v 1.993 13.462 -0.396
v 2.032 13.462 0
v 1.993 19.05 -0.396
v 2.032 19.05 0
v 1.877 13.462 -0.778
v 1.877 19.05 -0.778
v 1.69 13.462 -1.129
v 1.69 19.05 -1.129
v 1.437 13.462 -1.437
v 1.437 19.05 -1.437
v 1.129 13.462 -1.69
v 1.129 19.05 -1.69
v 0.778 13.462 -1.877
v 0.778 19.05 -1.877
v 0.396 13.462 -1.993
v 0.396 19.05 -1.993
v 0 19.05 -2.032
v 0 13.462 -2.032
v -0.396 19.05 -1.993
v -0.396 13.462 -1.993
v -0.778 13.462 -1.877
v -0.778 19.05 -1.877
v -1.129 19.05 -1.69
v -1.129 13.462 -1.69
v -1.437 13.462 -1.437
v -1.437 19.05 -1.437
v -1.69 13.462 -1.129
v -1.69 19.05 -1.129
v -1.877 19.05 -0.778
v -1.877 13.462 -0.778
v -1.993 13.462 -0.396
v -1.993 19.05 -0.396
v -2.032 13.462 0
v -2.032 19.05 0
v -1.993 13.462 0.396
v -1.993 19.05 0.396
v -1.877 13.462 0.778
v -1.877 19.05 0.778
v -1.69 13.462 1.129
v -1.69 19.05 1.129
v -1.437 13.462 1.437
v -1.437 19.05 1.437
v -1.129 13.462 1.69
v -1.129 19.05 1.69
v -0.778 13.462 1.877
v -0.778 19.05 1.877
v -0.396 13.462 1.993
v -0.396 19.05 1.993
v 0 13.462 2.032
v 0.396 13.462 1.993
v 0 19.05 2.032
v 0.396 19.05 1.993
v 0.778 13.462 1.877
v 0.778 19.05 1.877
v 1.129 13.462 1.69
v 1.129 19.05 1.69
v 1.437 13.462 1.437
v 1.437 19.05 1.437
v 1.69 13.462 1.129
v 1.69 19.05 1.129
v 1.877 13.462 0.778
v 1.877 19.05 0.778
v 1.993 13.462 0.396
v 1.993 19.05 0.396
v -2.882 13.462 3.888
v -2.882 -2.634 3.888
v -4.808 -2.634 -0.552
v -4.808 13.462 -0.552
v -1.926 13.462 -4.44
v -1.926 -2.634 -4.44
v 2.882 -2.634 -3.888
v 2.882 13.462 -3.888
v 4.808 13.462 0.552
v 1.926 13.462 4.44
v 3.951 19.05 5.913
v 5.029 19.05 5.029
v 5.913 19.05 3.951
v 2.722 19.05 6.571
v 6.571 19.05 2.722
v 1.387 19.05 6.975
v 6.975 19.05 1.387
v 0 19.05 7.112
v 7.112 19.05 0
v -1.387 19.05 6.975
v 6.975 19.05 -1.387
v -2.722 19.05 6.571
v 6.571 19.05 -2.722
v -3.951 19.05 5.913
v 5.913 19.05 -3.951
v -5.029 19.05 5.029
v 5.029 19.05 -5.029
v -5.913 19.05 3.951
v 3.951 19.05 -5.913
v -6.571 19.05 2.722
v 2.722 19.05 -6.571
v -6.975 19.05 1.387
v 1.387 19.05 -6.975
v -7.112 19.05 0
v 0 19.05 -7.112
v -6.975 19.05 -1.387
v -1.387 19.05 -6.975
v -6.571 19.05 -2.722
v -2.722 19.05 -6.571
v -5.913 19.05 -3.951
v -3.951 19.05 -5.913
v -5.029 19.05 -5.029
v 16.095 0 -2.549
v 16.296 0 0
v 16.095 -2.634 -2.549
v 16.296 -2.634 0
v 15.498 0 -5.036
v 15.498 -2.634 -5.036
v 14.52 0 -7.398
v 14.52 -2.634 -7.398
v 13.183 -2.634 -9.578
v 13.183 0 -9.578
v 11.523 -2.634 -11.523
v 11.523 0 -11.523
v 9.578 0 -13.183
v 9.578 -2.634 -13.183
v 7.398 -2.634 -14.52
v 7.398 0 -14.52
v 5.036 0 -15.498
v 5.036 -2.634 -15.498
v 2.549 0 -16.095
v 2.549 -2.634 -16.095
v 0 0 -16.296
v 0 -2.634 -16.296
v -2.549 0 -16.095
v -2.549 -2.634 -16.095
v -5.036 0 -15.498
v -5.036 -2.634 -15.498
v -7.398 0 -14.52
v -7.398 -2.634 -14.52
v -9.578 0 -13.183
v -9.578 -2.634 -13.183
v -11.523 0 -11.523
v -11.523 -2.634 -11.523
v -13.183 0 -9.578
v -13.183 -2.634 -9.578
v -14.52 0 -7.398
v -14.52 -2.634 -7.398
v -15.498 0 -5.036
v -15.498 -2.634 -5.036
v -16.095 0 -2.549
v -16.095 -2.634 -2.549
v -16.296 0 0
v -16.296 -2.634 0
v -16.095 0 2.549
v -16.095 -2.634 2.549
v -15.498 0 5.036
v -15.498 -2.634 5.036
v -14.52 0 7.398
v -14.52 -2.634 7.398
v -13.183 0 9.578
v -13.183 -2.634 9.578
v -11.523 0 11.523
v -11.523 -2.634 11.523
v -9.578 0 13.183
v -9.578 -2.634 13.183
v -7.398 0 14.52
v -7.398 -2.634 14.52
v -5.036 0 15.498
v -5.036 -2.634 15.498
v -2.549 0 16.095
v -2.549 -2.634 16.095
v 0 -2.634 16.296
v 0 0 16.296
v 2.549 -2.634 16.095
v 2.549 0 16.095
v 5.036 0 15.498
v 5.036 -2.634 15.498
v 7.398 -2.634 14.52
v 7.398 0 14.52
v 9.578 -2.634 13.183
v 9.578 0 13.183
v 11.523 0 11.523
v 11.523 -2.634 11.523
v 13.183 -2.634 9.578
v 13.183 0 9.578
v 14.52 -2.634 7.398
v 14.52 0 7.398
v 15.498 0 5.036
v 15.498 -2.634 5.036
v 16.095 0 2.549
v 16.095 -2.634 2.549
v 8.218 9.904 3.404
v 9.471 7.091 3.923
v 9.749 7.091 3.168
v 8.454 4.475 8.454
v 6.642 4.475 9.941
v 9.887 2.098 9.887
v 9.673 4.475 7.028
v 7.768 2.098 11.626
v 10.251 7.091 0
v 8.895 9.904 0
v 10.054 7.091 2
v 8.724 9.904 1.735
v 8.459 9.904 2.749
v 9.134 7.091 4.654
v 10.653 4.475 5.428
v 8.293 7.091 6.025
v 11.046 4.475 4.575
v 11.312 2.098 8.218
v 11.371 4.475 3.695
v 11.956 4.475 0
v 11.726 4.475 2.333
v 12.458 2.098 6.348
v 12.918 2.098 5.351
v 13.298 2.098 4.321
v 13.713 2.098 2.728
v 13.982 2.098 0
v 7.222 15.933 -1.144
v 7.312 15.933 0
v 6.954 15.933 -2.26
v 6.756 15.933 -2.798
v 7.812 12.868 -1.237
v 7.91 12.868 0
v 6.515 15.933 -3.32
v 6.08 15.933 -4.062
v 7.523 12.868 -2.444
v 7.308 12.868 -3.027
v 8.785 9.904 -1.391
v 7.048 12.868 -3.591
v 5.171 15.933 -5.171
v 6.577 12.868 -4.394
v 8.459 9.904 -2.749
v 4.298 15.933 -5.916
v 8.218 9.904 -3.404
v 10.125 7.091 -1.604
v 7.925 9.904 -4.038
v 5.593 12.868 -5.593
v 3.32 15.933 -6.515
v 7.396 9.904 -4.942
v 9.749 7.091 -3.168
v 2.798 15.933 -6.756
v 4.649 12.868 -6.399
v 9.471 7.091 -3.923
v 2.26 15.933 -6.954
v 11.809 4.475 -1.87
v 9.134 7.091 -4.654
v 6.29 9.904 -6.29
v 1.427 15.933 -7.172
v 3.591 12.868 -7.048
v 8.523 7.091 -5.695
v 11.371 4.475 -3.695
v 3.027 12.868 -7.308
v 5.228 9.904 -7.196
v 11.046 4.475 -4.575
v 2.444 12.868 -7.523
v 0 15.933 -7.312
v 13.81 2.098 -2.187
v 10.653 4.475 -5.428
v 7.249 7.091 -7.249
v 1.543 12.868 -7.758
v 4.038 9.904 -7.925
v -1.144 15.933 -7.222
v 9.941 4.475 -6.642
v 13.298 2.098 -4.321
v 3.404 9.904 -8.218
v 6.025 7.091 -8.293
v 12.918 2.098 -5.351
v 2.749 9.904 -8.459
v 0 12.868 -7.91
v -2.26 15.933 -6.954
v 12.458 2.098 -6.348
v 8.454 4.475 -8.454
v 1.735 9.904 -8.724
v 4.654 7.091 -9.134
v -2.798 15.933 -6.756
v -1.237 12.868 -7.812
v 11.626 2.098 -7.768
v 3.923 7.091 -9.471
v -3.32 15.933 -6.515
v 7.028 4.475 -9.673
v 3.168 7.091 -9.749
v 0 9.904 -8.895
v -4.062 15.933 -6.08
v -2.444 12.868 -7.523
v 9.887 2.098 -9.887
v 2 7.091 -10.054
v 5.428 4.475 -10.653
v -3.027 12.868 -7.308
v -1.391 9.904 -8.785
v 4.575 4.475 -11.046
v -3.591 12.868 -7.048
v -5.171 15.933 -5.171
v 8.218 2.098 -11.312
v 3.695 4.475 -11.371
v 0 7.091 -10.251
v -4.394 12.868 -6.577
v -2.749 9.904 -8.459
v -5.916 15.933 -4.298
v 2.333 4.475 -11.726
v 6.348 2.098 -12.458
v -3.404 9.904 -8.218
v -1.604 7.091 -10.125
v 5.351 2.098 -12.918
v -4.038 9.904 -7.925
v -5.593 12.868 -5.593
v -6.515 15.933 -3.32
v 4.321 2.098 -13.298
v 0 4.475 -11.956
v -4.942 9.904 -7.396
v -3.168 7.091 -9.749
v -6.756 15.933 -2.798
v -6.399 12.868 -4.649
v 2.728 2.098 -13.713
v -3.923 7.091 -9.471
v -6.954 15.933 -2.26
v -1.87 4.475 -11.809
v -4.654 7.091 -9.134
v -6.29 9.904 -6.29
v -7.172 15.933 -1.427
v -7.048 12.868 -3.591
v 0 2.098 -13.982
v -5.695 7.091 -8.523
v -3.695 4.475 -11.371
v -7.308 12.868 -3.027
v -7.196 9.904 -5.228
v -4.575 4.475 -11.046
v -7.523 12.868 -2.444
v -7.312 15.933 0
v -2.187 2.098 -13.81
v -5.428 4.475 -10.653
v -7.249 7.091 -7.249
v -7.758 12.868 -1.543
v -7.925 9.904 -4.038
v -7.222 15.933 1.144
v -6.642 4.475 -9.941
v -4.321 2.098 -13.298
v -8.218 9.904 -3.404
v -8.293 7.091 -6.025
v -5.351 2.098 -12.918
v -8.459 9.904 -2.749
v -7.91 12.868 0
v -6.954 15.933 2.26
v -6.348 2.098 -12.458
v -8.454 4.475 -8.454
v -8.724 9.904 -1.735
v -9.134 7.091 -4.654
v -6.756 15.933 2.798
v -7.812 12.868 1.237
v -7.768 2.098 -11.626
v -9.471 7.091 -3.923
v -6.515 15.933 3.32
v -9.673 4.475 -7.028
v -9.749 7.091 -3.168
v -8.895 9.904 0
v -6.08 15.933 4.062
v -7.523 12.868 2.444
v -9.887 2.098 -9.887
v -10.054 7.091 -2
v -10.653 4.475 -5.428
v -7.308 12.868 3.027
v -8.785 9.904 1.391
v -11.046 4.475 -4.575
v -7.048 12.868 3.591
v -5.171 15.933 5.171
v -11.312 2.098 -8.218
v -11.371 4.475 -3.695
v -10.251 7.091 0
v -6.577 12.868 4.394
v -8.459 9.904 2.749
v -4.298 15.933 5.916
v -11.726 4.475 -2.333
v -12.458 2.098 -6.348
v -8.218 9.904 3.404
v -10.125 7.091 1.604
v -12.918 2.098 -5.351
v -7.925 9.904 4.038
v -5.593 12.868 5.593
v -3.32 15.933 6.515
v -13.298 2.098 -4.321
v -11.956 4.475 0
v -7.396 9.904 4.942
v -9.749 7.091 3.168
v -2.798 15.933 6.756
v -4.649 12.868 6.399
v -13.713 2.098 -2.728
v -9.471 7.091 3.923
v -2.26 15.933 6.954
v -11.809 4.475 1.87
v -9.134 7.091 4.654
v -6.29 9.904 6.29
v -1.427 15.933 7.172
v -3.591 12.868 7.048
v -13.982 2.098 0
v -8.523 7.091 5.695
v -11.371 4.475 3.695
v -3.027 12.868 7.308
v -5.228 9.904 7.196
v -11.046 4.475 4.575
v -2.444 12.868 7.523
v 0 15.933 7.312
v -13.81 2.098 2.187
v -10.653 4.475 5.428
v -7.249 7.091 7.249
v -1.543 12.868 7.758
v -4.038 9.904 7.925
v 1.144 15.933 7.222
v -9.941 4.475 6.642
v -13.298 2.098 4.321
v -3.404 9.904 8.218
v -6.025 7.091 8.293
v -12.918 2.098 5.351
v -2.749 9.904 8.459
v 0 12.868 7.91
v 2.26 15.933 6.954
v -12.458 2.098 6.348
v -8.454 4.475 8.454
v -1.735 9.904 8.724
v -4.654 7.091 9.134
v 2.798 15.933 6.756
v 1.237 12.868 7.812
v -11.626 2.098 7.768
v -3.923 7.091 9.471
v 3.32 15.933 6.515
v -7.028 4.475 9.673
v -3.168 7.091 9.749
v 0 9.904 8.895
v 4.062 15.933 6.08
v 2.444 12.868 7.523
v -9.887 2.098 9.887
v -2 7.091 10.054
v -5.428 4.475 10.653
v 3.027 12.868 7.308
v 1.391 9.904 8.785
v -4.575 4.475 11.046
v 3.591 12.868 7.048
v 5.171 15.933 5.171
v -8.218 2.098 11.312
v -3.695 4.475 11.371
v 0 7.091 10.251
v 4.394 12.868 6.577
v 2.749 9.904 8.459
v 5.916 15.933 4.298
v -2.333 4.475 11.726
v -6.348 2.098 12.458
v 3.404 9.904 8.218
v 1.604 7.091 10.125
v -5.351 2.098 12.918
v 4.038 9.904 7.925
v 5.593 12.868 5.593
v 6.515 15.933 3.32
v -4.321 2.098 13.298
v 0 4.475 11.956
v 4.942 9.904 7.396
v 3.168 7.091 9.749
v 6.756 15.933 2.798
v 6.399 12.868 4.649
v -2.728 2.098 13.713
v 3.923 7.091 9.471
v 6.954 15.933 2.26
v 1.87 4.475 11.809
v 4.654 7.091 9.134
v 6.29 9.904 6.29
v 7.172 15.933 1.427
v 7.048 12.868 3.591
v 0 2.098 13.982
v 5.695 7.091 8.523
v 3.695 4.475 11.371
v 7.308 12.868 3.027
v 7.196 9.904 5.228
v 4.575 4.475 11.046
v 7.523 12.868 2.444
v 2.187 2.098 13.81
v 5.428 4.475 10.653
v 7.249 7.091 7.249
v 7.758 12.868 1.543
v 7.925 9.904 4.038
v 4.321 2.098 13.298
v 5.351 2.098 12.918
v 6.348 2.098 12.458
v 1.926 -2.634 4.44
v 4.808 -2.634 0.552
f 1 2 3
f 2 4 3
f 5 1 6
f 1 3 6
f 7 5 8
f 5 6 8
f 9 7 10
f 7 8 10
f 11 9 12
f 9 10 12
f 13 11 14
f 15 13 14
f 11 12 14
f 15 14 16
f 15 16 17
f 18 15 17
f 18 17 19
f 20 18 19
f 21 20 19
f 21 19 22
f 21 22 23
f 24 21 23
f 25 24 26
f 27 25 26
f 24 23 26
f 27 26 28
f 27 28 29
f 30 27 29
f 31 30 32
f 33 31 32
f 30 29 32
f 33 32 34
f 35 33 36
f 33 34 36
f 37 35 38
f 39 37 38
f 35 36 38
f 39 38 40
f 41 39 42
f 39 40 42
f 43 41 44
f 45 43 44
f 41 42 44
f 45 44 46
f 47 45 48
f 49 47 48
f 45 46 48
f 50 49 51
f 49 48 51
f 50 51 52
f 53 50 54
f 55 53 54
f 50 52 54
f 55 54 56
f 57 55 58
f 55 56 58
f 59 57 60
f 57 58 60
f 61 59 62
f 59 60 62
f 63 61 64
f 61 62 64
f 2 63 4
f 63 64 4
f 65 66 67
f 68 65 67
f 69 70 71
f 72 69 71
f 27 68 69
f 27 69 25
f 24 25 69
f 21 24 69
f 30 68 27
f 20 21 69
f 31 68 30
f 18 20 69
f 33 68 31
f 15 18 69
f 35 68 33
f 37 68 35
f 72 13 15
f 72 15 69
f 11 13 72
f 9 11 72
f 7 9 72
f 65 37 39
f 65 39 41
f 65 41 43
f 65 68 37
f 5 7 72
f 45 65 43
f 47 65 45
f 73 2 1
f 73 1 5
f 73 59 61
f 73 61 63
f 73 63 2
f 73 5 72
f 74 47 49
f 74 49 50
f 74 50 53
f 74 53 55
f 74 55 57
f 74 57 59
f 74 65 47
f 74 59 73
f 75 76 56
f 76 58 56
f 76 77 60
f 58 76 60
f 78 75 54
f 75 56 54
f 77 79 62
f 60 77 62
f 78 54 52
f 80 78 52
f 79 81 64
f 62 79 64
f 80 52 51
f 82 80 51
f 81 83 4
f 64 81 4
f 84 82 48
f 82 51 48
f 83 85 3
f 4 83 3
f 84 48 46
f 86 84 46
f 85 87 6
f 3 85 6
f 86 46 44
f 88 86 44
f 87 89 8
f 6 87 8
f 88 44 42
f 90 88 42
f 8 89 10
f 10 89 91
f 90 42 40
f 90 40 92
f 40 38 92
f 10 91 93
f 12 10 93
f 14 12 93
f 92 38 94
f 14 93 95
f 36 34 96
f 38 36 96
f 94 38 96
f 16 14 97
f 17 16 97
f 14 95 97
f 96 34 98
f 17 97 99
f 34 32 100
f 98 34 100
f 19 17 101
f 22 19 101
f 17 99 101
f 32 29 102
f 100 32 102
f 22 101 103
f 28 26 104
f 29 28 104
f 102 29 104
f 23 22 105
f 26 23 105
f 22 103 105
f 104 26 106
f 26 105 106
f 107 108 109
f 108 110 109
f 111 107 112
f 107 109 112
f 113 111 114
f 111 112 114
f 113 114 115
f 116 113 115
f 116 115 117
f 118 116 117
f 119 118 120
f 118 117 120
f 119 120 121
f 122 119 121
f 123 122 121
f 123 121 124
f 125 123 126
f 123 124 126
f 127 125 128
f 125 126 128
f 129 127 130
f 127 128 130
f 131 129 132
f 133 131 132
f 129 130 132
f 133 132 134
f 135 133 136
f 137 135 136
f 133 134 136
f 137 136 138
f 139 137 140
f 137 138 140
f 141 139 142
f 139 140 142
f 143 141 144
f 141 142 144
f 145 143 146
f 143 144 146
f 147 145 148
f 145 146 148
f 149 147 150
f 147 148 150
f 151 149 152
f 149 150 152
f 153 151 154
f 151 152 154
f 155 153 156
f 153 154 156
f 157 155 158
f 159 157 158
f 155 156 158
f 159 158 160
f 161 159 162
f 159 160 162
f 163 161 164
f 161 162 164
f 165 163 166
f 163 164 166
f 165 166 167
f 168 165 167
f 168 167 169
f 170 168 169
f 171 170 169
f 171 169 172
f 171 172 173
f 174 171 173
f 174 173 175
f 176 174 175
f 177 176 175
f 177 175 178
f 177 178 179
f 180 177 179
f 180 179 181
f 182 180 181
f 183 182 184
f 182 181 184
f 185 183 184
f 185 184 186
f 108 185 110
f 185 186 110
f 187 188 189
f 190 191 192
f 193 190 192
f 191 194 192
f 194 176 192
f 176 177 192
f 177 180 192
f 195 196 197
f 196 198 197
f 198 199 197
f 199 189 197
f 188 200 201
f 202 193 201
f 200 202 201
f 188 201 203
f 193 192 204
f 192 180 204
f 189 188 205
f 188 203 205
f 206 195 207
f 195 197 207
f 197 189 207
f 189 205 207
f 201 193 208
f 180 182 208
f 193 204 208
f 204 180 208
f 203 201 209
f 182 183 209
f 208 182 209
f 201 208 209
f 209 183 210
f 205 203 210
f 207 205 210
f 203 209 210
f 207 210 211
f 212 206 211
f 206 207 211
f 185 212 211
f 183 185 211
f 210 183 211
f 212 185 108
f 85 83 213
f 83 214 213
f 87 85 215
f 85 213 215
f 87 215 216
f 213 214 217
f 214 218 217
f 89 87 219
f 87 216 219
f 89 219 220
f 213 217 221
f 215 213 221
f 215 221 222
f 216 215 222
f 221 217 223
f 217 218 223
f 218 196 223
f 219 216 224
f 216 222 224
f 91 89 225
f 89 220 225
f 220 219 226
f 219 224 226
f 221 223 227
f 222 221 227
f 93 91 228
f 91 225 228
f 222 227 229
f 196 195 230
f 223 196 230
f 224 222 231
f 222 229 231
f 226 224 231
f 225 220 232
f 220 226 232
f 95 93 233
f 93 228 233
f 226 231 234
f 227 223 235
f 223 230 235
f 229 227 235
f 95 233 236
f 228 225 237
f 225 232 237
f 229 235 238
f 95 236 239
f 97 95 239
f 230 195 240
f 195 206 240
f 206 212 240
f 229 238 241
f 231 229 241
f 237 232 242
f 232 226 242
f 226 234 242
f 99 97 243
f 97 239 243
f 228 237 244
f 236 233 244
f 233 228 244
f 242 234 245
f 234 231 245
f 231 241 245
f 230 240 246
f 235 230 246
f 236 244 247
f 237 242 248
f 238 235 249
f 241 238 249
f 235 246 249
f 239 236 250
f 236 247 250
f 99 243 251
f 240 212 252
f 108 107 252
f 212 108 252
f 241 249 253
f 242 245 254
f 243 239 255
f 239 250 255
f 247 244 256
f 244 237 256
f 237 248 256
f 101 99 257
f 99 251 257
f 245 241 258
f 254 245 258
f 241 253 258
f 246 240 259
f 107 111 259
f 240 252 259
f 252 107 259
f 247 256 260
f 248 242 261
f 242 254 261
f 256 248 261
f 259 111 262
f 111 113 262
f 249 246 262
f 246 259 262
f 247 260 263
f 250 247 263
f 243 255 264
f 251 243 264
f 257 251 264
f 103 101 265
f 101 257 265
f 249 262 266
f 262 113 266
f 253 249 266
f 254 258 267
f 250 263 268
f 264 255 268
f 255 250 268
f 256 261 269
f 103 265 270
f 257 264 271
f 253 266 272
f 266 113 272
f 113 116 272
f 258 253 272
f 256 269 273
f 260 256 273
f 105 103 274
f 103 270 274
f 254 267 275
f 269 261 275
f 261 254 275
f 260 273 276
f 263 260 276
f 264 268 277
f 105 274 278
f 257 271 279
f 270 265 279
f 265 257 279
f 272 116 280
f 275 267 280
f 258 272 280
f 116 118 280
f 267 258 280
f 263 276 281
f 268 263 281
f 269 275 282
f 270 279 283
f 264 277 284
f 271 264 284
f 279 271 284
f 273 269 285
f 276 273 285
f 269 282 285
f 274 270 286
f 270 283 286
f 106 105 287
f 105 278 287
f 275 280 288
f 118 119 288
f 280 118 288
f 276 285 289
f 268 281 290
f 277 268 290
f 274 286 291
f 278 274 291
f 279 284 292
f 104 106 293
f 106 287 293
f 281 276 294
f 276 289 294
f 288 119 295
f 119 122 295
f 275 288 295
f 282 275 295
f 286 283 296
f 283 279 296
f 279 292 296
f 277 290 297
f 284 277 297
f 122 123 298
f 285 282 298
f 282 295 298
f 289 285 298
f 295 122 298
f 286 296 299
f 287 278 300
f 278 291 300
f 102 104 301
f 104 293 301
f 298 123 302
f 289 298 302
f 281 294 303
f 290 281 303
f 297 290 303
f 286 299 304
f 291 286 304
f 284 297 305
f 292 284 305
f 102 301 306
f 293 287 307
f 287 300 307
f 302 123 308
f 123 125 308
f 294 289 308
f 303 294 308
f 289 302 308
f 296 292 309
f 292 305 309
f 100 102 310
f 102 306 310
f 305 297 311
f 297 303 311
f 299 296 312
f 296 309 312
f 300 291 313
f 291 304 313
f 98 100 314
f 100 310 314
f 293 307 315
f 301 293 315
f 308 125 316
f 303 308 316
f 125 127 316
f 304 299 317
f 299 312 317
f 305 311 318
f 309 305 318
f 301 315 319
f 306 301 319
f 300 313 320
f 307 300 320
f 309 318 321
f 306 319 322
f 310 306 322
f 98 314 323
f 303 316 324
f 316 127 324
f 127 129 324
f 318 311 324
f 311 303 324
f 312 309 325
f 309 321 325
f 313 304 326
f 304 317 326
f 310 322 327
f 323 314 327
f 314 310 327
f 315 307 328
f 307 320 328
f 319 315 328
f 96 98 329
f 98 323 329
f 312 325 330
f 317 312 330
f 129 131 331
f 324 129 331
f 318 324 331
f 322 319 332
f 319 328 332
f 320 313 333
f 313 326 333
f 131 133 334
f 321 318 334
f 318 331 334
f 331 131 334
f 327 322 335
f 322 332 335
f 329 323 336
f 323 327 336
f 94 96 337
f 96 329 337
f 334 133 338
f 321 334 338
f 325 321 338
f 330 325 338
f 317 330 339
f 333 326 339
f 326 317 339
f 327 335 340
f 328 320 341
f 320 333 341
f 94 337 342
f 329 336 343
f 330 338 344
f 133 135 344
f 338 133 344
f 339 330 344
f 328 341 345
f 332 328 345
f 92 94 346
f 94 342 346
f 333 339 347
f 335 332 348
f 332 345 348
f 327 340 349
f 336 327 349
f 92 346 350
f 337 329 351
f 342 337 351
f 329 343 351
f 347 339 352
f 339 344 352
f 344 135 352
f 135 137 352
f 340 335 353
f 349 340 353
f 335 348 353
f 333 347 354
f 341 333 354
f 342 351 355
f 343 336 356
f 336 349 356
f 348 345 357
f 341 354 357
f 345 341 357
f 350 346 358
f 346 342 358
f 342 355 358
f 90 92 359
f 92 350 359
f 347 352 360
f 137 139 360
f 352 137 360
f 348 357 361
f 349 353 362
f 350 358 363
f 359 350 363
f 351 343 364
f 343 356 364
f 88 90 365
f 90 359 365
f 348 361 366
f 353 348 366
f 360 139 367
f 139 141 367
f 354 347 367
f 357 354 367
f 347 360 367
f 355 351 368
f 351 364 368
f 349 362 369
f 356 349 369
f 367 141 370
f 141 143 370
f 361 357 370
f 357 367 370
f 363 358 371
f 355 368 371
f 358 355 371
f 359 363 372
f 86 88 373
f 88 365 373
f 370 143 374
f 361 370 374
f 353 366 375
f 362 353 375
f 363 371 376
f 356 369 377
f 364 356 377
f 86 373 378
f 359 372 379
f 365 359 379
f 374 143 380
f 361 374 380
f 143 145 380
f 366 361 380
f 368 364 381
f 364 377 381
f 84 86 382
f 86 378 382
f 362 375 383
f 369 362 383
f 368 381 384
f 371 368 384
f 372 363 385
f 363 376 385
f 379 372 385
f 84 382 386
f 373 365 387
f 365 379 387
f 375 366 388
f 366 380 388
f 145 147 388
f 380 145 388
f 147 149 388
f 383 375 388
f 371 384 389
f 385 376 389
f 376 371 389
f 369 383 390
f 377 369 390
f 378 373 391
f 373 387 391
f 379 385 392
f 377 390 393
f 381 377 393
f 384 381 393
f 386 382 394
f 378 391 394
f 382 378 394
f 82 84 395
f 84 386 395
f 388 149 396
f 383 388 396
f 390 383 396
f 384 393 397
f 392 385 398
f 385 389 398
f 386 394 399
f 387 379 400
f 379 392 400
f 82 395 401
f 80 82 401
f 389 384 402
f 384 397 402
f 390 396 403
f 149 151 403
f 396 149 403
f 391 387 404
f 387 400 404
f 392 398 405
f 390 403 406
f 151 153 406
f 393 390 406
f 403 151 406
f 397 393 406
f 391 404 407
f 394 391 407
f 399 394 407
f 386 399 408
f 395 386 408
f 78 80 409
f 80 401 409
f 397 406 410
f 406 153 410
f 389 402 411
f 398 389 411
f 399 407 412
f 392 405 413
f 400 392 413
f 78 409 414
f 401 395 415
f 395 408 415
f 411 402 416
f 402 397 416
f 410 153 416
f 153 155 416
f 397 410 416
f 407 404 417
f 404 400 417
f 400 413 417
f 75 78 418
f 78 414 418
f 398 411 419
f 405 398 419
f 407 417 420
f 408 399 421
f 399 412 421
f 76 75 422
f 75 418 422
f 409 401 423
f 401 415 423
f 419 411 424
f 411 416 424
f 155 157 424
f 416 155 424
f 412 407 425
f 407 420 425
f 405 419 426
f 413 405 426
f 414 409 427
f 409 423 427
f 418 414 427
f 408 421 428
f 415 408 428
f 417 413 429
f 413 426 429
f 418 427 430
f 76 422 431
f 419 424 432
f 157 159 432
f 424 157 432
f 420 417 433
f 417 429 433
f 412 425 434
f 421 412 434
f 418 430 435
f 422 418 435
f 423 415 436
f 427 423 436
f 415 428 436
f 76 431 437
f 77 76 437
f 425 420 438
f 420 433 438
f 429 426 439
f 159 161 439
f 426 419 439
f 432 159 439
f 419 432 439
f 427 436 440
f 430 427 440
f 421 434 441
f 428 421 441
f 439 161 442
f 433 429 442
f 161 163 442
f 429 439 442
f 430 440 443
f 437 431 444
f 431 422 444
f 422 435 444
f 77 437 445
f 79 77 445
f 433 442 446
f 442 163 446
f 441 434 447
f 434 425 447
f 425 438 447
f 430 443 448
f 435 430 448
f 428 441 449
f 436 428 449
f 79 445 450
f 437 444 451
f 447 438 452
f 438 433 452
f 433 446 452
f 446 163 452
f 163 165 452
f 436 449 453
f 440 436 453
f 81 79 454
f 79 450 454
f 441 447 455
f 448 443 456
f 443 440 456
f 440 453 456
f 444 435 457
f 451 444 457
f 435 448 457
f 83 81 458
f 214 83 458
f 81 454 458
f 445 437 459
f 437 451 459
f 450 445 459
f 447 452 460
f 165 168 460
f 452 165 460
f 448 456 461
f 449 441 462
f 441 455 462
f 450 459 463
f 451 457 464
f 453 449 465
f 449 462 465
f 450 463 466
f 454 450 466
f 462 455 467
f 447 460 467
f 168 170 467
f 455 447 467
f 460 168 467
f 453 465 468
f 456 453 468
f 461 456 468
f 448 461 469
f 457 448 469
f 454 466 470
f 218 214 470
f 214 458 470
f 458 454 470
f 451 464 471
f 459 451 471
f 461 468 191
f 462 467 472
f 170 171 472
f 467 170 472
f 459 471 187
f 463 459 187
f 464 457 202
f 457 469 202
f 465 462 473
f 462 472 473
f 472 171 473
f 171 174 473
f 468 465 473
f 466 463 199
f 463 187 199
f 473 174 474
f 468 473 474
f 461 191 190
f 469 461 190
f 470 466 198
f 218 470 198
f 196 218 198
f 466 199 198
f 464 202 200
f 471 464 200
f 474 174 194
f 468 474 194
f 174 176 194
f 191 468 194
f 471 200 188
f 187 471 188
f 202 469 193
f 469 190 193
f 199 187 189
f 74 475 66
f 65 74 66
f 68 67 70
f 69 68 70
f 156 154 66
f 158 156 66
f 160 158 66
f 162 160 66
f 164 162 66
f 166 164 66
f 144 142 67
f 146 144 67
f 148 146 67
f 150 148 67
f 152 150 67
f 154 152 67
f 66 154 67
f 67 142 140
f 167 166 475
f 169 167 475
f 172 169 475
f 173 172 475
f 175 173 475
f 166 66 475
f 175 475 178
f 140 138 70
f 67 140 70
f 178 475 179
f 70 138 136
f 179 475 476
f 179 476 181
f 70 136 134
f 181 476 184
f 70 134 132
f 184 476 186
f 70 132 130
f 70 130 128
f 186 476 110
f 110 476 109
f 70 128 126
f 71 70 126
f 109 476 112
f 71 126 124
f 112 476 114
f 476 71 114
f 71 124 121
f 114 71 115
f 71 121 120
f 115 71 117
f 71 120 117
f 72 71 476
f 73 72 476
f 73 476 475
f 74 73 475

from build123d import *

# Parameters (mm, degrees)
CUT_EXTRUDE1_DEPTH = 16.096219


with BuildPart() as part:
    # Sketch2 → Revolve1 (revolve)
    with BuildSketch(Plane.XY):
        with BuildLine():
            Line((2.032, -2.634219297), (2.032, 19.05))
            Line((2.032, 19.05), (7.112, 19.05))
            ThreePointArc((7.112, 19.05), (9.527739154, 8.475956955), (16.295629201, 0))
            Line((16.295629201, 0), (16.295629201, -2.634219297))
            Line((16.295629201, -2.634219297), (2.032, -2.634219297))
        make_face()
    revolve(axis=Axis((0, 0, 0), (0, 1, 0)))

    # Sketch3 → Cut-Extrude1 (cut)
    with BuildSketch(Plane.XZ.offset(2.634219297)):
        Polygon((4.80775348, 0.552100056), (1.925744066, 4.439686677), (-2.882009414, 3.887586621), (-4.80775348, -0.552100056), (-1.925744066, -4.439686677), (2.882009414, -3.887586621), align=None)
    extrude(amount=-CUT_EXTRUDE1_DEPTH, mode=Mode.SUBTRACT)


solid = part.part
